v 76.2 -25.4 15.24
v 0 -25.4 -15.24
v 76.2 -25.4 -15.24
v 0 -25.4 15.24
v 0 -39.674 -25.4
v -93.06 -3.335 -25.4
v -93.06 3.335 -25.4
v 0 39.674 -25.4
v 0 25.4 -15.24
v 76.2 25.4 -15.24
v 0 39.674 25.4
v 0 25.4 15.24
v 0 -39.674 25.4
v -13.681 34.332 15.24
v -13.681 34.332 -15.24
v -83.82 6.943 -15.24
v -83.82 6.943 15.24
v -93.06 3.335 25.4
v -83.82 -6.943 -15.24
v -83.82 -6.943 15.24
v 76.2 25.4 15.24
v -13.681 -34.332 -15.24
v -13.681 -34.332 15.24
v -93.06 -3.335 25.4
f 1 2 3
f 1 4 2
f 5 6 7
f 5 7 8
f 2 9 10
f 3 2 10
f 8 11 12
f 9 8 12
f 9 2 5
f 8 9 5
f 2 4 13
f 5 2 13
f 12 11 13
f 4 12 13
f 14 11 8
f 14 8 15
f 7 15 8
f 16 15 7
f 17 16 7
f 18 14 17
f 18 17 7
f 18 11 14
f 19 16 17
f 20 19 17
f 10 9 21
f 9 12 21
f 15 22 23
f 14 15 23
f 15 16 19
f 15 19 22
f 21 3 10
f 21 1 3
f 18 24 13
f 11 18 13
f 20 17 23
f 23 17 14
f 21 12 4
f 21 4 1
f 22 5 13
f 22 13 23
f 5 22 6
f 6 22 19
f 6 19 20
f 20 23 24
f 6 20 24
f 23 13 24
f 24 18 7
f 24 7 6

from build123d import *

# Parameters (mm, degrees)
F1_DEPTH = 25.4
F2_W     = 70.138792
F2_H     = 30.48
F3_DEPTH = 63.5
F5_DEPTH = 25.4
F6_W     = 76.2
F6_H     = 25.4
F7_DEPTH = 15.24


with BuildPart() as f1:
    # F0 (on Top) → F1 (new body, symmetric)
    with BuildSketch(Plane.XY):
        Polygon((0, -36.525619), (0, 39.674381), (-101.6, 0), align=None)
    extrude(amount=F1_DEPTH, both=True)

    # F2 (on Front) → F3 (cut, symmetric)
    with BuildSketch(Plane.XZ):
        with Locations((-48.750604, 0)):
            Rectangle(F2_W, F2_H)
    extrude(amount=F3_DEPTH, both=True, mode=Mode.SUBTRACT)

    # F4 (on Top) → F5 (cut, symmetric)
    with BuildSketch(Plane.XY):
        Polygon((-93.059749, 3.334933), (-101.6, 0), (-93.059749, -3.070255), align=None)
    extrude(amount=F5_DEPTH, both=True, mode=Mode.SUBTRACT)

    # F6 (on Top) → F7 (join, symmetric)
    with BuildSketch(Plane.XY):
        with Locations((38.1, 12.7)):
            Rectangle(F6_W, F6_H)
    extrude(amount=F7_DEPTH, both=True)

    # F8: F1 across plane


with BuildPart() as f1_1:
    add(f1.part)
    add(f1.part.mirror(Plane.XZ))


solid = f1_1.part
